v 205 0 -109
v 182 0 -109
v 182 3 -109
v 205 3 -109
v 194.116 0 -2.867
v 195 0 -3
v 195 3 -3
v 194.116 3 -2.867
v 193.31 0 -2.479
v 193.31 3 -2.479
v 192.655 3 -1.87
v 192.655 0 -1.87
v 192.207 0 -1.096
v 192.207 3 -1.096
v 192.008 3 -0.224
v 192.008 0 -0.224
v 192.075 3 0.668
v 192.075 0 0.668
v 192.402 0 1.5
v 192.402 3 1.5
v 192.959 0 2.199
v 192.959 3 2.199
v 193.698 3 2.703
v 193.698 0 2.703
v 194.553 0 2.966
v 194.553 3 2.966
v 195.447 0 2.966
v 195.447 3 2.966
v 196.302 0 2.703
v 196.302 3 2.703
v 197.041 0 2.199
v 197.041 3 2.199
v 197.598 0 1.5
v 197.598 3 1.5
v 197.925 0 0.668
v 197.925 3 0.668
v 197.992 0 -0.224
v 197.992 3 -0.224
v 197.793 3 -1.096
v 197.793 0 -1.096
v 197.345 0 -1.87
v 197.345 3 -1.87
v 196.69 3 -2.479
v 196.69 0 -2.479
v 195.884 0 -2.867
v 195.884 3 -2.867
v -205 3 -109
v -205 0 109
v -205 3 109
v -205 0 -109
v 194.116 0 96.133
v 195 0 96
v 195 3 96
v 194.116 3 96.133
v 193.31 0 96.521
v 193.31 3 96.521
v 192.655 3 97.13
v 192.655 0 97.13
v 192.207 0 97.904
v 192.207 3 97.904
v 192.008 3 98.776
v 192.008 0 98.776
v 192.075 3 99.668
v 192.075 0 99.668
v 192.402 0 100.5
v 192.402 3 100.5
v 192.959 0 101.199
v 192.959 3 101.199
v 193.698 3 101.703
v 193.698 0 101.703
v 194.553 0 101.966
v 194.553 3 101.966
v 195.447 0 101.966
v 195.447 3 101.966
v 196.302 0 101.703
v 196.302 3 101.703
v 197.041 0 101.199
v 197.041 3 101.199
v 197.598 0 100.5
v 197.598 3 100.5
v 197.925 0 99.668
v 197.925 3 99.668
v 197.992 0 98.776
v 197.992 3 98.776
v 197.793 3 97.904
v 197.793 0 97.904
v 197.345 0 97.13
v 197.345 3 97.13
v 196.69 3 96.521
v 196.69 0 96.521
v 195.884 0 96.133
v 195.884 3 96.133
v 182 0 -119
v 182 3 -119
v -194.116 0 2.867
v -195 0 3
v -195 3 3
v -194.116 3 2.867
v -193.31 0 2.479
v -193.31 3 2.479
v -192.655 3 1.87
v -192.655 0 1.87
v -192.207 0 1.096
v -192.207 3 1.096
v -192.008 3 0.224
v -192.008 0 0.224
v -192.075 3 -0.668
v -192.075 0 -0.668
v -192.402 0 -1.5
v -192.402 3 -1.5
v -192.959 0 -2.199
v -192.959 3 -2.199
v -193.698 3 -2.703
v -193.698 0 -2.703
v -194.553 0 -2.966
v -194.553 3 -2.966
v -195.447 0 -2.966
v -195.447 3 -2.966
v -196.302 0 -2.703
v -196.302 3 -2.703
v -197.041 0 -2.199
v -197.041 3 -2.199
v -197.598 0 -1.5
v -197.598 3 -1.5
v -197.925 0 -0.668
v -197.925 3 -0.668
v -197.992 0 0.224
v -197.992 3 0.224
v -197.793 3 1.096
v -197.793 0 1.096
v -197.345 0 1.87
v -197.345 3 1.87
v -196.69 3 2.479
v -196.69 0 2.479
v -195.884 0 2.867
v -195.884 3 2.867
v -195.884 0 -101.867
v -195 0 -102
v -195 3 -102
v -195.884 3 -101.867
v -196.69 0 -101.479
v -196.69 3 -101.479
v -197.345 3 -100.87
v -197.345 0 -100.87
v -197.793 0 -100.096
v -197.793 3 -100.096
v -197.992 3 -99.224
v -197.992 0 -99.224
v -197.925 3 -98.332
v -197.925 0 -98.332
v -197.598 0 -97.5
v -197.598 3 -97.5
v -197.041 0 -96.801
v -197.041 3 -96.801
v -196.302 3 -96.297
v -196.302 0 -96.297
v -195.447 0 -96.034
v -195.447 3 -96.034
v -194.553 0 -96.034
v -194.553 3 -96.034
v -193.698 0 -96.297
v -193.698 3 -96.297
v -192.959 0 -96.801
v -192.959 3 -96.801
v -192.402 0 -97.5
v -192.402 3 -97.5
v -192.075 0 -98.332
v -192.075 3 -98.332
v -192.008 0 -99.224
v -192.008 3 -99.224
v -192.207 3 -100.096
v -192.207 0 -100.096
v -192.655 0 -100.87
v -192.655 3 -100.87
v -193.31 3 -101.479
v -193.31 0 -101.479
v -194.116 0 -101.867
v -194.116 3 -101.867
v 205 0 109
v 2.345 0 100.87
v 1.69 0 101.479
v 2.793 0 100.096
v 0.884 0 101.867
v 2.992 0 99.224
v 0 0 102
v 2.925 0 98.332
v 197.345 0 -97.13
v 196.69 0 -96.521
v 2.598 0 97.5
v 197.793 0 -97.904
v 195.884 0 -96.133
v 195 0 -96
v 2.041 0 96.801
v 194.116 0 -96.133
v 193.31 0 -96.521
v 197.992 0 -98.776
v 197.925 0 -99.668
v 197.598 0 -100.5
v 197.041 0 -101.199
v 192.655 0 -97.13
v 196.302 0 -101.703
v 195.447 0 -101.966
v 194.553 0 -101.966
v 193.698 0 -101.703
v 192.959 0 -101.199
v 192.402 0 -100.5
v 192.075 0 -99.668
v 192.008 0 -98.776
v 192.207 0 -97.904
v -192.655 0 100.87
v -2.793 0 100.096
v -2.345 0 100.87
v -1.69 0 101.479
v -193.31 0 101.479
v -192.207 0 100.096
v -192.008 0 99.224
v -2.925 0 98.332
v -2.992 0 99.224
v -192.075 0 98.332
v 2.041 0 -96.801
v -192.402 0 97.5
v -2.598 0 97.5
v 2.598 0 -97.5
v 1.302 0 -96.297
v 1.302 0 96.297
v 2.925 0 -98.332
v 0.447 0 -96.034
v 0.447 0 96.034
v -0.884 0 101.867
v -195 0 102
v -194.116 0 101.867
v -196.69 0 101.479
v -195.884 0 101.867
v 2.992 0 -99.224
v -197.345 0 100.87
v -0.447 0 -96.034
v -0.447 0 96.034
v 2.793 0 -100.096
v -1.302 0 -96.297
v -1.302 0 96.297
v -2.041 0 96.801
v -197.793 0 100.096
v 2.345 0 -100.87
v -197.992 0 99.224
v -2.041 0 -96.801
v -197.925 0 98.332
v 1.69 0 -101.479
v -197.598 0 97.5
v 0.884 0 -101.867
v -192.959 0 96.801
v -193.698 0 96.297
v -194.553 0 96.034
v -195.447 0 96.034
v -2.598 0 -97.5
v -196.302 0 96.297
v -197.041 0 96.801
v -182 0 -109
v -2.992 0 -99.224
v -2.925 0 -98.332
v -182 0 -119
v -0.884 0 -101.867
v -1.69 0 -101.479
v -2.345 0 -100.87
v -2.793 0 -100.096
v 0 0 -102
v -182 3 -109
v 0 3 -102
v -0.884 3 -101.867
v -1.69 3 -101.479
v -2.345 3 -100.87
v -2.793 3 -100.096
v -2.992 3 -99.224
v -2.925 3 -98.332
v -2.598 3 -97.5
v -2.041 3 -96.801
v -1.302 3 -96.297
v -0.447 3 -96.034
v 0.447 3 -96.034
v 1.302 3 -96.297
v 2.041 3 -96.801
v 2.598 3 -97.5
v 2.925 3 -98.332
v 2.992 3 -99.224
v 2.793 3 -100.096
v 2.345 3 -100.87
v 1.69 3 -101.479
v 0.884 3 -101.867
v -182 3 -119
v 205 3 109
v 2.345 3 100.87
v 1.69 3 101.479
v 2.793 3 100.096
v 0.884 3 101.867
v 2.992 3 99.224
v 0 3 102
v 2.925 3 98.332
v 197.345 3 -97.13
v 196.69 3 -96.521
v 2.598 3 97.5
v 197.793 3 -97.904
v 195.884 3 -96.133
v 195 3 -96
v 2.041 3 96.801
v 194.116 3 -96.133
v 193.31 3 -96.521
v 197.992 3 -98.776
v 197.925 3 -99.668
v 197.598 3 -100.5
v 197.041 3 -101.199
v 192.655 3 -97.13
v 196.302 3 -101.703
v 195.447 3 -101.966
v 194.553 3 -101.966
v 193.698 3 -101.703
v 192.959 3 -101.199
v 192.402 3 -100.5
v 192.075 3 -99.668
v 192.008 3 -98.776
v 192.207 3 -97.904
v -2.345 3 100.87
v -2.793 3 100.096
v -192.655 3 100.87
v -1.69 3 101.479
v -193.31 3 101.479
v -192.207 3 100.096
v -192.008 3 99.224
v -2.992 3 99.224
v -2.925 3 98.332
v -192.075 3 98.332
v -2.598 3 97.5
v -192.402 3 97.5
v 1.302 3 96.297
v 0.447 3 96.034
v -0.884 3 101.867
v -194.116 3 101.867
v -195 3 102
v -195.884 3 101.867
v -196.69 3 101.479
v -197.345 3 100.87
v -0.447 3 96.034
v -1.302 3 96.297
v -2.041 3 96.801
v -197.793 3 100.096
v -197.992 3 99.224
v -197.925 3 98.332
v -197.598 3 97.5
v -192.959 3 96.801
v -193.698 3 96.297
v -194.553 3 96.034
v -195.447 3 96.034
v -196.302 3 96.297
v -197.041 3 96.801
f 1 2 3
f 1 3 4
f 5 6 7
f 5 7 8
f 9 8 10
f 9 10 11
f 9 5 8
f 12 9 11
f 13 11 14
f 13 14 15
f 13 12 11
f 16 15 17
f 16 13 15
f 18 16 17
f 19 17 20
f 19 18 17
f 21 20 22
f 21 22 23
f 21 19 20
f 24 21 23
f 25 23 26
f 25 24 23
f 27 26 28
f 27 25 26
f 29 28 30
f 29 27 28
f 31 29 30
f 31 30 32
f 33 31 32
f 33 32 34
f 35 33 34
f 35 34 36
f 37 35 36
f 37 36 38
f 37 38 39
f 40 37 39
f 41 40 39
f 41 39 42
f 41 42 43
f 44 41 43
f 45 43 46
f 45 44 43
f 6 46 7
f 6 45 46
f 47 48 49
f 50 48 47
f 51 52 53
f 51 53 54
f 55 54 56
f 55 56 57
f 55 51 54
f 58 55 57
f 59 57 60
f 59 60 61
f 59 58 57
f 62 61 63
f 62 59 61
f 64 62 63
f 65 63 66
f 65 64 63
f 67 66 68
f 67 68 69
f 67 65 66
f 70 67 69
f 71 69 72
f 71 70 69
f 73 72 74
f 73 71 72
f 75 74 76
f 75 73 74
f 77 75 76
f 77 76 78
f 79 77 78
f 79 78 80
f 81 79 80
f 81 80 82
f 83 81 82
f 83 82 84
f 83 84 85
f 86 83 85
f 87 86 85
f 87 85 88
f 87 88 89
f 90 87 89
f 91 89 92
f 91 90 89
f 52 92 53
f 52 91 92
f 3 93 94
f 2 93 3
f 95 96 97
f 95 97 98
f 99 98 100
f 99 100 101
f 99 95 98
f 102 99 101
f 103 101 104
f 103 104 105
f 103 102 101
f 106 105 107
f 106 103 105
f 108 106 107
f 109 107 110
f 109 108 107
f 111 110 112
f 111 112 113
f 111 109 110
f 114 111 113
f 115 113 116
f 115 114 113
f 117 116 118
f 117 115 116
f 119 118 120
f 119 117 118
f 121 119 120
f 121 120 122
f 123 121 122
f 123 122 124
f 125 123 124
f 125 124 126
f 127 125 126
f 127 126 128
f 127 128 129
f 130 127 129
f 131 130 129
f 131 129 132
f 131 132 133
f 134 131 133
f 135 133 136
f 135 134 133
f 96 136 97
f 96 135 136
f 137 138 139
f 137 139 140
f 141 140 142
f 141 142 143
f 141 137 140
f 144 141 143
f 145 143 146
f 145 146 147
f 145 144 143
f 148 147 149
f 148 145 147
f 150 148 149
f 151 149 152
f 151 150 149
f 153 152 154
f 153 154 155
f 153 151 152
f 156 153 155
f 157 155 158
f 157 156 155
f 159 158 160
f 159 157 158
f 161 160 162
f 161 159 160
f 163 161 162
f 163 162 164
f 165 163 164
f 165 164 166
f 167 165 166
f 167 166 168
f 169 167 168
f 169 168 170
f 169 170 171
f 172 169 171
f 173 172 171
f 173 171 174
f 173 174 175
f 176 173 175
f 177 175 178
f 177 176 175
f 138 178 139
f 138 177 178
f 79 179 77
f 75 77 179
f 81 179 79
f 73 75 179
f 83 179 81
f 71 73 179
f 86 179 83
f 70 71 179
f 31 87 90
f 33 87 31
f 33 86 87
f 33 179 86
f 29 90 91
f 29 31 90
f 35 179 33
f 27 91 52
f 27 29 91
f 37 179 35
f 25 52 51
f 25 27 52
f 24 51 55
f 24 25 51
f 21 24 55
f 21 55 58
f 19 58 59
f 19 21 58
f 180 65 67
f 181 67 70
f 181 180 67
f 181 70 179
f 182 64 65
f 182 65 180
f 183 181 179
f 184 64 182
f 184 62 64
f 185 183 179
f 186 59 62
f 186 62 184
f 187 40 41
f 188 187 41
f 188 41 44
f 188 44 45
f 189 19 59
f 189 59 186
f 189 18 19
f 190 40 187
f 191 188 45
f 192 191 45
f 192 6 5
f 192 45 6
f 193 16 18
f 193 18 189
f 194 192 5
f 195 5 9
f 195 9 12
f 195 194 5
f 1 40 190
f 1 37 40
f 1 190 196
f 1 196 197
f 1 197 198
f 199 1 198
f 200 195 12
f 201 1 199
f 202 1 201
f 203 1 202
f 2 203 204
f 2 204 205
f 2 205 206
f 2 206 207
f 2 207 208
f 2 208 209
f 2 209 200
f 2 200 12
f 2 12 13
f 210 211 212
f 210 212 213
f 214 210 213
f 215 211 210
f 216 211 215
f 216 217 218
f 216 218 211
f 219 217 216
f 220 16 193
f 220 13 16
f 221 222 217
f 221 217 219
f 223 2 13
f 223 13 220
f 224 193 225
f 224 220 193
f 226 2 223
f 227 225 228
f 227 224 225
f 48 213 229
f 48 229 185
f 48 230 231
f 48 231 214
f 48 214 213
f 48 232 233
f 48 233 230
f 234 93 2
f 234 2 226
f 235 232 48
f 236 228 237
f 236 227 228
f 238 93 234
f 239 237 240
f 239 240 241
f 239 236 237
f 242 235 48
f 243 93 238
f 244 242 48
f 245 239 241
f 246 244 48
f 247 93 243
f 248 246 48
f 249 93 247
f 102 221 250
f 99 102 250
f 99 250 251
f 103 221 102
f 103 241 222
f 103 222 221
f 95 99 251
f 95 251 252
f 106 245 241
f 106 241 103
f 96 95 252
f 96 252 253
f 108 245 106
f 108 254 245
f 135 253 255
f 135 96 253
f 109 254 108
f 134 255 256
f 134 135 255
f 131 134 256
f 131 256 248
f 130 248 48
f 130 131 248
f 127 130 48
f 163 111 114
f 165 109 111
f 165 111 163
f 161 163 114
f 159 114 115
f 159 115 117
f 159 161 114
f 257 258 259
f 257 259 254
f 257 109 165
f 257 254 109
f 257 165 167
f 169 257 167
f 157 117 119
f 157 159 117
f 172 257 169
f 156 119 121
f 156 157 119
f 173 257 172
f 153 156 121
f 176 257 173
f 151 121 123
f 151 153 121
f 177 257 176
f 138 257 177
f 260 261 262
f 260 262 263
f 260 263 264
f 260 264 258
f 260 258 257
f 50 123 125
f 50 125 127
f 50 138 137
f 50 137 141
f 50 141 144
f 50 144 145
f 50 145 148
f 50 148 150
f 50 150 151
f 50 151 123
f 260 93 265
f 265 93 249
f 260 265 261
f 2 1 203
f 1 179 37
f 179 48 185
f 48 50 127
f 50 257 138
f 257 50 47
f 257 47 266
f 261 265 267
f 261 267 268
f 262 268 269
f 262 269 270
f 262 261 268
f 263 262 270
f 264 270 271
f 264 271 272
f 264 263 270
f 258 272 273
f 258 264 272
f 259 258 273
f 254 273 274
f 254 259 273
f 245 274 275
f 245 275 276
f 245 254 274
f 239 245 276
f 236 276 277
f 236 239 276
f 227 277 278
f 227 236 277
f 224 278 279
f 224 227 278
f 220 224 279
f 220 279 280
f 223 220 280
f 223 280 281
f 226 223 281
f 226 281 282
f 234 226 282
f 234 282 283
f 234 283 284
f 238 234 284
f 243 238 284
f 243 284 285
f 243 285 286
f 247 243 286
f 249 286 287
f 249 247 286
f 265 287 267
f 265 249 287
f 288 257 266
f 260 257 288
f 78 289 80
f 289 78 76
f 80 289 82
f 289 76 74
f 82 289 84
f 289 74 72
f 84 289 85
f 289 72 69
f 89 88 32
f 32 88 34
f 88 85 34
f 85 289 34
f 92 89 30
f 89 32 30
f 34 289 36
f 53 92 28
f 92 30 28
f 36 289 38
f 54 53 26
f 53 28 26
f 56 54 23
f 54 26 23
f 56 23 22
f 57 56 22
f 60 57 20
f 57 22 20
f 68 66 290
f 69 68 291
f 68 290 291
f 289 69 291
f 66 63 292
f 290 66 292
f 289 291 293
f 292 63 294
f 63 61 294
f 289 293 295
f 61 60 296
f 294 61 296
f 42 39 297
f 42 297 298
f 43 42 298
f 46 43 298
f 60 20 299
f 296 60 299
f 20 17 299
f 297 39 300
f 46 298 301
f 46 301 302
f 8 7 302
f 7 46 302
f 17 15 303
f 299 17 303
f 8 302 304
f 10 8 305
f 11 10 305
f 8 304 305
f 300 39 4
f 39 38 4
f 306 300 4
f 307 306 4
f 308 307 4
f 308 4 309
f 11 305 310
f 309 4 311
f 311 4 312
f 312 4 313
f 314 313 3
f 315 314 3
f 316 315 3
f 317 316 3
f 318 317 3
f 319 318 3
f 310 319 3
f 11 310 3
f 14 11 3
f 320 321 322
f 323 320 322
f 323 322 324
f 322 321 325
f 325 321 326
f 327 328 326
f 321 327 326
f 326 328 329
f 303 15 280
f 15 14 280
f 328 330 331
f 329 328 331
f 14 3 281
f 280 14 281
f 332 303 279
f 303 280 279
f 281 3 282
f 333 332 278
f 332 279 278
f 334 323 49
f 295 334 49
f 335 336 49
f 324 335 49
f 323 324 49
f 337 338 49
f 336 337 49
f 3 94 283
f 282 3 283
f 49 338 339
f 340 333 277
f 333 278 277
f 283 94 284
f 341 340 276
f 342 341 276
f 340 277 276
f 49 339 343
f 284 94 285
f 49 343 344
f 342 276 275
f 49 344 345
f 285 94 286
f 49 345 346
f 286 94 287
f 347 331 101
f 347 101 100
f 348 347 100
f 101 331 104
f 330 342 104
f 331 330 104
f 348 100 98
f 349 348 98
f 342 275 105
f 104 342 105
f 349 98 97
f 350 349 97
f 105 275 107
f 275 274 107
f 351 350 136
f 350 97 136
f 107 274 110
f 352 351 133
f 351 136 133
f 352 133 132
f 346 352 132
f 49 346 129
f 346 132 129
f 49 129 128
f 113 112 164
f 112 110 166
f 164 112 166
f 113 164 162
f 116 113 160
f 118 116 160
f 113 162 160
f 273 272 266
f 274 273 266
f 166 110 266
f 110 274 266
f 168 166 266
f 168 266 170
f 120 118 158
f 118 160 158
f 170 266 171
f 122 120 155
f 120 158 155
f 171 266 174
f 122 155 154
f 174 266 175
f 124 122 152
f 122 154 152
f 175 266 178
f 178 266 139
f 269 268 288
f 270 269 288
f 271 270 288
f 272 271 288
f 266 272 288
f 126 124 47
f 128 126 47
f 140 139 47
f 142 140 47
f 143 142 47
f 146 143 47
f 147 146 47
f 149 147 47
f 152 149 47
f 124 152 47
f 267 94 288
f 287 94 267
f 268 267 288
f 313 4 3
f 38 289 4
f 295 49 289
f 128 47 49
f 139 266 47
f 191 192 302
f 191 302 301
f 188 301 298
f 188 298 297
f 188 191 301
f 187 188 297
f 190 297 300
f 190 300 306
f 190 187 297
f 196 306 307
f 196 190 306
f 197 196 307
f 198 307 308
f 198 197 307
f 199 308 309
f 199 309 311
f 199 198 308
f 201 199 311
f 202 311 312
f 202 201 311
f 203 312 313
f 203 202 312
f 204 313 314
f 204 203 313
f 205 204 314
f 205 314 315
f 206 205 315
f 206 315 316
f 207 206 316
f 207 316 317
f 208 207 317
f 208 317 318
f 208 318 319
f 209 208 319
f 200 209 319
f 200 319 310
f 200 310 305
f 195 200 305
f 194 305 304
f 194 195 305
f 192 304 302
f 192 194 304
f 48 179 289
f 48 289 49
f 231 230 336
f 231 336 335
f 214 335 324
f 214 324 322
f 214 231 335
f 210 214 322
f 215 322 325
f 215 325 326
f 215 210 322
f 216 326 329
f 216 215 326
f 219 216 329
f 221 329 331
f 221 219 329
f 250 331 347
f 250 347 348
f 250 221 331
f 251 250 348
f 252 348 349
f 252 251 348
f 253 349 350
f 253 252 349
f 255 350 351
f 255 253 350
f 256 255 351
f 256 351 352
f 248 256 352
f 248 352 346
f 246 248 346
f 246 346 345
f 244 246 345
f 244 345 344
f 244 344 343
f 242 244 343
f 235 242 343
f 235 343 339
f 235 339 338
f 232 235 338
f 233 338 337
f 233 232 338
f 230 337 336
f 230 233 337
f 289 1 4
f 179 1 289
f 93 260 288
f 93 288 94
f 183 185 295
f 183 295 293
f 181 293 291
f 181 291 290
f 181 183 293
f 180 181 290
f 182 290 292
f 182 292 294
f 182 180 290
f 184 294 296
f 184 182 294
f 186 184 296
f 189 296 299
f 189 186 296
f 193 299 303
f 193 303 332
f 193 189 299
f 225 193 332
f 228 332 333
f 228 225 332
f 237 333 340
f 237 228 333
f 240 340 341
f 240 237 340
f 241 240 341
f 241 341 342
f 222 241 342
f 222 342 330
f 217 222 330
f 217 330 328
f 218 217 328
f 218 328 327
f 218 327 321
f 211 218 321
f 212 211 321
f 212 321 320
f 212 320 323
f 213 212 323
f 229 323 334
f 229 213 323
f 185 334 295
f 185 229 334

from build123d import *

# Parameters (mm, degrees)
CROQUIS1_R              = 3
SALIENTE_EXTRUIR1_DEPTH = 3


with BuildPart() as part:
    # Croquis1 → Saliente-Extruir1 (new body)
    with BuildSketch(Plane(origin=(0, 0, 0), x_dir=(1, 0, 0), z_dir=(0, 1, 0))):
        Polygon((-182, 109), (-182, 119), (182, 119), (182, 109), (205, 109), (205, -109), (-205, -109), (-205, 109), align=None)
        with Locations(Location((-195, -99, 0), (0, 0, 270))):
            Circle(CROQUIS1_R, mode=Mode.SUBTRACT)
        with Locations(Location((0, -99, 0), (0, 0, 270))):
            Circle(CROQUIS1_R, mode=Mode.SUBTRACT)
        with Locations(Location((-195, 0, 0), (0, 0, 270))):
            Circle(CROQUIS1_R, mode=Mode.SUBTRACT)
        with Locations(Location((-195, 99, 0), (0, 0, 90))):
            Circle(CROQUIS1_R, mode=Mode.SUBTRACT)
        with Locations(Location((195, 99, 0), (0, 0, 270))):
            Circle(CROQUIS1_R, mode=Mode.SUBTRACT)
        with Locations(Location((195, 0, 0), (0, 0, 90))):
            Circle(CROQUIS1_R, mode=Mode.SUBTRACT)
        with Locations(Location((195, -99, 0), (0, 0, 90))):
            Circle(CROQUIS1_R, mode=Mode.SUBTRACT)
        with Locations(Location((0, 99, 0), (0, 0, 90))):
            Circle(CROQUIS1_R, mode=Mode.SUBTRACT)
    extrude(amount=SALIENTE_EXTRUIR1_DEPTH)


solid = part.part
